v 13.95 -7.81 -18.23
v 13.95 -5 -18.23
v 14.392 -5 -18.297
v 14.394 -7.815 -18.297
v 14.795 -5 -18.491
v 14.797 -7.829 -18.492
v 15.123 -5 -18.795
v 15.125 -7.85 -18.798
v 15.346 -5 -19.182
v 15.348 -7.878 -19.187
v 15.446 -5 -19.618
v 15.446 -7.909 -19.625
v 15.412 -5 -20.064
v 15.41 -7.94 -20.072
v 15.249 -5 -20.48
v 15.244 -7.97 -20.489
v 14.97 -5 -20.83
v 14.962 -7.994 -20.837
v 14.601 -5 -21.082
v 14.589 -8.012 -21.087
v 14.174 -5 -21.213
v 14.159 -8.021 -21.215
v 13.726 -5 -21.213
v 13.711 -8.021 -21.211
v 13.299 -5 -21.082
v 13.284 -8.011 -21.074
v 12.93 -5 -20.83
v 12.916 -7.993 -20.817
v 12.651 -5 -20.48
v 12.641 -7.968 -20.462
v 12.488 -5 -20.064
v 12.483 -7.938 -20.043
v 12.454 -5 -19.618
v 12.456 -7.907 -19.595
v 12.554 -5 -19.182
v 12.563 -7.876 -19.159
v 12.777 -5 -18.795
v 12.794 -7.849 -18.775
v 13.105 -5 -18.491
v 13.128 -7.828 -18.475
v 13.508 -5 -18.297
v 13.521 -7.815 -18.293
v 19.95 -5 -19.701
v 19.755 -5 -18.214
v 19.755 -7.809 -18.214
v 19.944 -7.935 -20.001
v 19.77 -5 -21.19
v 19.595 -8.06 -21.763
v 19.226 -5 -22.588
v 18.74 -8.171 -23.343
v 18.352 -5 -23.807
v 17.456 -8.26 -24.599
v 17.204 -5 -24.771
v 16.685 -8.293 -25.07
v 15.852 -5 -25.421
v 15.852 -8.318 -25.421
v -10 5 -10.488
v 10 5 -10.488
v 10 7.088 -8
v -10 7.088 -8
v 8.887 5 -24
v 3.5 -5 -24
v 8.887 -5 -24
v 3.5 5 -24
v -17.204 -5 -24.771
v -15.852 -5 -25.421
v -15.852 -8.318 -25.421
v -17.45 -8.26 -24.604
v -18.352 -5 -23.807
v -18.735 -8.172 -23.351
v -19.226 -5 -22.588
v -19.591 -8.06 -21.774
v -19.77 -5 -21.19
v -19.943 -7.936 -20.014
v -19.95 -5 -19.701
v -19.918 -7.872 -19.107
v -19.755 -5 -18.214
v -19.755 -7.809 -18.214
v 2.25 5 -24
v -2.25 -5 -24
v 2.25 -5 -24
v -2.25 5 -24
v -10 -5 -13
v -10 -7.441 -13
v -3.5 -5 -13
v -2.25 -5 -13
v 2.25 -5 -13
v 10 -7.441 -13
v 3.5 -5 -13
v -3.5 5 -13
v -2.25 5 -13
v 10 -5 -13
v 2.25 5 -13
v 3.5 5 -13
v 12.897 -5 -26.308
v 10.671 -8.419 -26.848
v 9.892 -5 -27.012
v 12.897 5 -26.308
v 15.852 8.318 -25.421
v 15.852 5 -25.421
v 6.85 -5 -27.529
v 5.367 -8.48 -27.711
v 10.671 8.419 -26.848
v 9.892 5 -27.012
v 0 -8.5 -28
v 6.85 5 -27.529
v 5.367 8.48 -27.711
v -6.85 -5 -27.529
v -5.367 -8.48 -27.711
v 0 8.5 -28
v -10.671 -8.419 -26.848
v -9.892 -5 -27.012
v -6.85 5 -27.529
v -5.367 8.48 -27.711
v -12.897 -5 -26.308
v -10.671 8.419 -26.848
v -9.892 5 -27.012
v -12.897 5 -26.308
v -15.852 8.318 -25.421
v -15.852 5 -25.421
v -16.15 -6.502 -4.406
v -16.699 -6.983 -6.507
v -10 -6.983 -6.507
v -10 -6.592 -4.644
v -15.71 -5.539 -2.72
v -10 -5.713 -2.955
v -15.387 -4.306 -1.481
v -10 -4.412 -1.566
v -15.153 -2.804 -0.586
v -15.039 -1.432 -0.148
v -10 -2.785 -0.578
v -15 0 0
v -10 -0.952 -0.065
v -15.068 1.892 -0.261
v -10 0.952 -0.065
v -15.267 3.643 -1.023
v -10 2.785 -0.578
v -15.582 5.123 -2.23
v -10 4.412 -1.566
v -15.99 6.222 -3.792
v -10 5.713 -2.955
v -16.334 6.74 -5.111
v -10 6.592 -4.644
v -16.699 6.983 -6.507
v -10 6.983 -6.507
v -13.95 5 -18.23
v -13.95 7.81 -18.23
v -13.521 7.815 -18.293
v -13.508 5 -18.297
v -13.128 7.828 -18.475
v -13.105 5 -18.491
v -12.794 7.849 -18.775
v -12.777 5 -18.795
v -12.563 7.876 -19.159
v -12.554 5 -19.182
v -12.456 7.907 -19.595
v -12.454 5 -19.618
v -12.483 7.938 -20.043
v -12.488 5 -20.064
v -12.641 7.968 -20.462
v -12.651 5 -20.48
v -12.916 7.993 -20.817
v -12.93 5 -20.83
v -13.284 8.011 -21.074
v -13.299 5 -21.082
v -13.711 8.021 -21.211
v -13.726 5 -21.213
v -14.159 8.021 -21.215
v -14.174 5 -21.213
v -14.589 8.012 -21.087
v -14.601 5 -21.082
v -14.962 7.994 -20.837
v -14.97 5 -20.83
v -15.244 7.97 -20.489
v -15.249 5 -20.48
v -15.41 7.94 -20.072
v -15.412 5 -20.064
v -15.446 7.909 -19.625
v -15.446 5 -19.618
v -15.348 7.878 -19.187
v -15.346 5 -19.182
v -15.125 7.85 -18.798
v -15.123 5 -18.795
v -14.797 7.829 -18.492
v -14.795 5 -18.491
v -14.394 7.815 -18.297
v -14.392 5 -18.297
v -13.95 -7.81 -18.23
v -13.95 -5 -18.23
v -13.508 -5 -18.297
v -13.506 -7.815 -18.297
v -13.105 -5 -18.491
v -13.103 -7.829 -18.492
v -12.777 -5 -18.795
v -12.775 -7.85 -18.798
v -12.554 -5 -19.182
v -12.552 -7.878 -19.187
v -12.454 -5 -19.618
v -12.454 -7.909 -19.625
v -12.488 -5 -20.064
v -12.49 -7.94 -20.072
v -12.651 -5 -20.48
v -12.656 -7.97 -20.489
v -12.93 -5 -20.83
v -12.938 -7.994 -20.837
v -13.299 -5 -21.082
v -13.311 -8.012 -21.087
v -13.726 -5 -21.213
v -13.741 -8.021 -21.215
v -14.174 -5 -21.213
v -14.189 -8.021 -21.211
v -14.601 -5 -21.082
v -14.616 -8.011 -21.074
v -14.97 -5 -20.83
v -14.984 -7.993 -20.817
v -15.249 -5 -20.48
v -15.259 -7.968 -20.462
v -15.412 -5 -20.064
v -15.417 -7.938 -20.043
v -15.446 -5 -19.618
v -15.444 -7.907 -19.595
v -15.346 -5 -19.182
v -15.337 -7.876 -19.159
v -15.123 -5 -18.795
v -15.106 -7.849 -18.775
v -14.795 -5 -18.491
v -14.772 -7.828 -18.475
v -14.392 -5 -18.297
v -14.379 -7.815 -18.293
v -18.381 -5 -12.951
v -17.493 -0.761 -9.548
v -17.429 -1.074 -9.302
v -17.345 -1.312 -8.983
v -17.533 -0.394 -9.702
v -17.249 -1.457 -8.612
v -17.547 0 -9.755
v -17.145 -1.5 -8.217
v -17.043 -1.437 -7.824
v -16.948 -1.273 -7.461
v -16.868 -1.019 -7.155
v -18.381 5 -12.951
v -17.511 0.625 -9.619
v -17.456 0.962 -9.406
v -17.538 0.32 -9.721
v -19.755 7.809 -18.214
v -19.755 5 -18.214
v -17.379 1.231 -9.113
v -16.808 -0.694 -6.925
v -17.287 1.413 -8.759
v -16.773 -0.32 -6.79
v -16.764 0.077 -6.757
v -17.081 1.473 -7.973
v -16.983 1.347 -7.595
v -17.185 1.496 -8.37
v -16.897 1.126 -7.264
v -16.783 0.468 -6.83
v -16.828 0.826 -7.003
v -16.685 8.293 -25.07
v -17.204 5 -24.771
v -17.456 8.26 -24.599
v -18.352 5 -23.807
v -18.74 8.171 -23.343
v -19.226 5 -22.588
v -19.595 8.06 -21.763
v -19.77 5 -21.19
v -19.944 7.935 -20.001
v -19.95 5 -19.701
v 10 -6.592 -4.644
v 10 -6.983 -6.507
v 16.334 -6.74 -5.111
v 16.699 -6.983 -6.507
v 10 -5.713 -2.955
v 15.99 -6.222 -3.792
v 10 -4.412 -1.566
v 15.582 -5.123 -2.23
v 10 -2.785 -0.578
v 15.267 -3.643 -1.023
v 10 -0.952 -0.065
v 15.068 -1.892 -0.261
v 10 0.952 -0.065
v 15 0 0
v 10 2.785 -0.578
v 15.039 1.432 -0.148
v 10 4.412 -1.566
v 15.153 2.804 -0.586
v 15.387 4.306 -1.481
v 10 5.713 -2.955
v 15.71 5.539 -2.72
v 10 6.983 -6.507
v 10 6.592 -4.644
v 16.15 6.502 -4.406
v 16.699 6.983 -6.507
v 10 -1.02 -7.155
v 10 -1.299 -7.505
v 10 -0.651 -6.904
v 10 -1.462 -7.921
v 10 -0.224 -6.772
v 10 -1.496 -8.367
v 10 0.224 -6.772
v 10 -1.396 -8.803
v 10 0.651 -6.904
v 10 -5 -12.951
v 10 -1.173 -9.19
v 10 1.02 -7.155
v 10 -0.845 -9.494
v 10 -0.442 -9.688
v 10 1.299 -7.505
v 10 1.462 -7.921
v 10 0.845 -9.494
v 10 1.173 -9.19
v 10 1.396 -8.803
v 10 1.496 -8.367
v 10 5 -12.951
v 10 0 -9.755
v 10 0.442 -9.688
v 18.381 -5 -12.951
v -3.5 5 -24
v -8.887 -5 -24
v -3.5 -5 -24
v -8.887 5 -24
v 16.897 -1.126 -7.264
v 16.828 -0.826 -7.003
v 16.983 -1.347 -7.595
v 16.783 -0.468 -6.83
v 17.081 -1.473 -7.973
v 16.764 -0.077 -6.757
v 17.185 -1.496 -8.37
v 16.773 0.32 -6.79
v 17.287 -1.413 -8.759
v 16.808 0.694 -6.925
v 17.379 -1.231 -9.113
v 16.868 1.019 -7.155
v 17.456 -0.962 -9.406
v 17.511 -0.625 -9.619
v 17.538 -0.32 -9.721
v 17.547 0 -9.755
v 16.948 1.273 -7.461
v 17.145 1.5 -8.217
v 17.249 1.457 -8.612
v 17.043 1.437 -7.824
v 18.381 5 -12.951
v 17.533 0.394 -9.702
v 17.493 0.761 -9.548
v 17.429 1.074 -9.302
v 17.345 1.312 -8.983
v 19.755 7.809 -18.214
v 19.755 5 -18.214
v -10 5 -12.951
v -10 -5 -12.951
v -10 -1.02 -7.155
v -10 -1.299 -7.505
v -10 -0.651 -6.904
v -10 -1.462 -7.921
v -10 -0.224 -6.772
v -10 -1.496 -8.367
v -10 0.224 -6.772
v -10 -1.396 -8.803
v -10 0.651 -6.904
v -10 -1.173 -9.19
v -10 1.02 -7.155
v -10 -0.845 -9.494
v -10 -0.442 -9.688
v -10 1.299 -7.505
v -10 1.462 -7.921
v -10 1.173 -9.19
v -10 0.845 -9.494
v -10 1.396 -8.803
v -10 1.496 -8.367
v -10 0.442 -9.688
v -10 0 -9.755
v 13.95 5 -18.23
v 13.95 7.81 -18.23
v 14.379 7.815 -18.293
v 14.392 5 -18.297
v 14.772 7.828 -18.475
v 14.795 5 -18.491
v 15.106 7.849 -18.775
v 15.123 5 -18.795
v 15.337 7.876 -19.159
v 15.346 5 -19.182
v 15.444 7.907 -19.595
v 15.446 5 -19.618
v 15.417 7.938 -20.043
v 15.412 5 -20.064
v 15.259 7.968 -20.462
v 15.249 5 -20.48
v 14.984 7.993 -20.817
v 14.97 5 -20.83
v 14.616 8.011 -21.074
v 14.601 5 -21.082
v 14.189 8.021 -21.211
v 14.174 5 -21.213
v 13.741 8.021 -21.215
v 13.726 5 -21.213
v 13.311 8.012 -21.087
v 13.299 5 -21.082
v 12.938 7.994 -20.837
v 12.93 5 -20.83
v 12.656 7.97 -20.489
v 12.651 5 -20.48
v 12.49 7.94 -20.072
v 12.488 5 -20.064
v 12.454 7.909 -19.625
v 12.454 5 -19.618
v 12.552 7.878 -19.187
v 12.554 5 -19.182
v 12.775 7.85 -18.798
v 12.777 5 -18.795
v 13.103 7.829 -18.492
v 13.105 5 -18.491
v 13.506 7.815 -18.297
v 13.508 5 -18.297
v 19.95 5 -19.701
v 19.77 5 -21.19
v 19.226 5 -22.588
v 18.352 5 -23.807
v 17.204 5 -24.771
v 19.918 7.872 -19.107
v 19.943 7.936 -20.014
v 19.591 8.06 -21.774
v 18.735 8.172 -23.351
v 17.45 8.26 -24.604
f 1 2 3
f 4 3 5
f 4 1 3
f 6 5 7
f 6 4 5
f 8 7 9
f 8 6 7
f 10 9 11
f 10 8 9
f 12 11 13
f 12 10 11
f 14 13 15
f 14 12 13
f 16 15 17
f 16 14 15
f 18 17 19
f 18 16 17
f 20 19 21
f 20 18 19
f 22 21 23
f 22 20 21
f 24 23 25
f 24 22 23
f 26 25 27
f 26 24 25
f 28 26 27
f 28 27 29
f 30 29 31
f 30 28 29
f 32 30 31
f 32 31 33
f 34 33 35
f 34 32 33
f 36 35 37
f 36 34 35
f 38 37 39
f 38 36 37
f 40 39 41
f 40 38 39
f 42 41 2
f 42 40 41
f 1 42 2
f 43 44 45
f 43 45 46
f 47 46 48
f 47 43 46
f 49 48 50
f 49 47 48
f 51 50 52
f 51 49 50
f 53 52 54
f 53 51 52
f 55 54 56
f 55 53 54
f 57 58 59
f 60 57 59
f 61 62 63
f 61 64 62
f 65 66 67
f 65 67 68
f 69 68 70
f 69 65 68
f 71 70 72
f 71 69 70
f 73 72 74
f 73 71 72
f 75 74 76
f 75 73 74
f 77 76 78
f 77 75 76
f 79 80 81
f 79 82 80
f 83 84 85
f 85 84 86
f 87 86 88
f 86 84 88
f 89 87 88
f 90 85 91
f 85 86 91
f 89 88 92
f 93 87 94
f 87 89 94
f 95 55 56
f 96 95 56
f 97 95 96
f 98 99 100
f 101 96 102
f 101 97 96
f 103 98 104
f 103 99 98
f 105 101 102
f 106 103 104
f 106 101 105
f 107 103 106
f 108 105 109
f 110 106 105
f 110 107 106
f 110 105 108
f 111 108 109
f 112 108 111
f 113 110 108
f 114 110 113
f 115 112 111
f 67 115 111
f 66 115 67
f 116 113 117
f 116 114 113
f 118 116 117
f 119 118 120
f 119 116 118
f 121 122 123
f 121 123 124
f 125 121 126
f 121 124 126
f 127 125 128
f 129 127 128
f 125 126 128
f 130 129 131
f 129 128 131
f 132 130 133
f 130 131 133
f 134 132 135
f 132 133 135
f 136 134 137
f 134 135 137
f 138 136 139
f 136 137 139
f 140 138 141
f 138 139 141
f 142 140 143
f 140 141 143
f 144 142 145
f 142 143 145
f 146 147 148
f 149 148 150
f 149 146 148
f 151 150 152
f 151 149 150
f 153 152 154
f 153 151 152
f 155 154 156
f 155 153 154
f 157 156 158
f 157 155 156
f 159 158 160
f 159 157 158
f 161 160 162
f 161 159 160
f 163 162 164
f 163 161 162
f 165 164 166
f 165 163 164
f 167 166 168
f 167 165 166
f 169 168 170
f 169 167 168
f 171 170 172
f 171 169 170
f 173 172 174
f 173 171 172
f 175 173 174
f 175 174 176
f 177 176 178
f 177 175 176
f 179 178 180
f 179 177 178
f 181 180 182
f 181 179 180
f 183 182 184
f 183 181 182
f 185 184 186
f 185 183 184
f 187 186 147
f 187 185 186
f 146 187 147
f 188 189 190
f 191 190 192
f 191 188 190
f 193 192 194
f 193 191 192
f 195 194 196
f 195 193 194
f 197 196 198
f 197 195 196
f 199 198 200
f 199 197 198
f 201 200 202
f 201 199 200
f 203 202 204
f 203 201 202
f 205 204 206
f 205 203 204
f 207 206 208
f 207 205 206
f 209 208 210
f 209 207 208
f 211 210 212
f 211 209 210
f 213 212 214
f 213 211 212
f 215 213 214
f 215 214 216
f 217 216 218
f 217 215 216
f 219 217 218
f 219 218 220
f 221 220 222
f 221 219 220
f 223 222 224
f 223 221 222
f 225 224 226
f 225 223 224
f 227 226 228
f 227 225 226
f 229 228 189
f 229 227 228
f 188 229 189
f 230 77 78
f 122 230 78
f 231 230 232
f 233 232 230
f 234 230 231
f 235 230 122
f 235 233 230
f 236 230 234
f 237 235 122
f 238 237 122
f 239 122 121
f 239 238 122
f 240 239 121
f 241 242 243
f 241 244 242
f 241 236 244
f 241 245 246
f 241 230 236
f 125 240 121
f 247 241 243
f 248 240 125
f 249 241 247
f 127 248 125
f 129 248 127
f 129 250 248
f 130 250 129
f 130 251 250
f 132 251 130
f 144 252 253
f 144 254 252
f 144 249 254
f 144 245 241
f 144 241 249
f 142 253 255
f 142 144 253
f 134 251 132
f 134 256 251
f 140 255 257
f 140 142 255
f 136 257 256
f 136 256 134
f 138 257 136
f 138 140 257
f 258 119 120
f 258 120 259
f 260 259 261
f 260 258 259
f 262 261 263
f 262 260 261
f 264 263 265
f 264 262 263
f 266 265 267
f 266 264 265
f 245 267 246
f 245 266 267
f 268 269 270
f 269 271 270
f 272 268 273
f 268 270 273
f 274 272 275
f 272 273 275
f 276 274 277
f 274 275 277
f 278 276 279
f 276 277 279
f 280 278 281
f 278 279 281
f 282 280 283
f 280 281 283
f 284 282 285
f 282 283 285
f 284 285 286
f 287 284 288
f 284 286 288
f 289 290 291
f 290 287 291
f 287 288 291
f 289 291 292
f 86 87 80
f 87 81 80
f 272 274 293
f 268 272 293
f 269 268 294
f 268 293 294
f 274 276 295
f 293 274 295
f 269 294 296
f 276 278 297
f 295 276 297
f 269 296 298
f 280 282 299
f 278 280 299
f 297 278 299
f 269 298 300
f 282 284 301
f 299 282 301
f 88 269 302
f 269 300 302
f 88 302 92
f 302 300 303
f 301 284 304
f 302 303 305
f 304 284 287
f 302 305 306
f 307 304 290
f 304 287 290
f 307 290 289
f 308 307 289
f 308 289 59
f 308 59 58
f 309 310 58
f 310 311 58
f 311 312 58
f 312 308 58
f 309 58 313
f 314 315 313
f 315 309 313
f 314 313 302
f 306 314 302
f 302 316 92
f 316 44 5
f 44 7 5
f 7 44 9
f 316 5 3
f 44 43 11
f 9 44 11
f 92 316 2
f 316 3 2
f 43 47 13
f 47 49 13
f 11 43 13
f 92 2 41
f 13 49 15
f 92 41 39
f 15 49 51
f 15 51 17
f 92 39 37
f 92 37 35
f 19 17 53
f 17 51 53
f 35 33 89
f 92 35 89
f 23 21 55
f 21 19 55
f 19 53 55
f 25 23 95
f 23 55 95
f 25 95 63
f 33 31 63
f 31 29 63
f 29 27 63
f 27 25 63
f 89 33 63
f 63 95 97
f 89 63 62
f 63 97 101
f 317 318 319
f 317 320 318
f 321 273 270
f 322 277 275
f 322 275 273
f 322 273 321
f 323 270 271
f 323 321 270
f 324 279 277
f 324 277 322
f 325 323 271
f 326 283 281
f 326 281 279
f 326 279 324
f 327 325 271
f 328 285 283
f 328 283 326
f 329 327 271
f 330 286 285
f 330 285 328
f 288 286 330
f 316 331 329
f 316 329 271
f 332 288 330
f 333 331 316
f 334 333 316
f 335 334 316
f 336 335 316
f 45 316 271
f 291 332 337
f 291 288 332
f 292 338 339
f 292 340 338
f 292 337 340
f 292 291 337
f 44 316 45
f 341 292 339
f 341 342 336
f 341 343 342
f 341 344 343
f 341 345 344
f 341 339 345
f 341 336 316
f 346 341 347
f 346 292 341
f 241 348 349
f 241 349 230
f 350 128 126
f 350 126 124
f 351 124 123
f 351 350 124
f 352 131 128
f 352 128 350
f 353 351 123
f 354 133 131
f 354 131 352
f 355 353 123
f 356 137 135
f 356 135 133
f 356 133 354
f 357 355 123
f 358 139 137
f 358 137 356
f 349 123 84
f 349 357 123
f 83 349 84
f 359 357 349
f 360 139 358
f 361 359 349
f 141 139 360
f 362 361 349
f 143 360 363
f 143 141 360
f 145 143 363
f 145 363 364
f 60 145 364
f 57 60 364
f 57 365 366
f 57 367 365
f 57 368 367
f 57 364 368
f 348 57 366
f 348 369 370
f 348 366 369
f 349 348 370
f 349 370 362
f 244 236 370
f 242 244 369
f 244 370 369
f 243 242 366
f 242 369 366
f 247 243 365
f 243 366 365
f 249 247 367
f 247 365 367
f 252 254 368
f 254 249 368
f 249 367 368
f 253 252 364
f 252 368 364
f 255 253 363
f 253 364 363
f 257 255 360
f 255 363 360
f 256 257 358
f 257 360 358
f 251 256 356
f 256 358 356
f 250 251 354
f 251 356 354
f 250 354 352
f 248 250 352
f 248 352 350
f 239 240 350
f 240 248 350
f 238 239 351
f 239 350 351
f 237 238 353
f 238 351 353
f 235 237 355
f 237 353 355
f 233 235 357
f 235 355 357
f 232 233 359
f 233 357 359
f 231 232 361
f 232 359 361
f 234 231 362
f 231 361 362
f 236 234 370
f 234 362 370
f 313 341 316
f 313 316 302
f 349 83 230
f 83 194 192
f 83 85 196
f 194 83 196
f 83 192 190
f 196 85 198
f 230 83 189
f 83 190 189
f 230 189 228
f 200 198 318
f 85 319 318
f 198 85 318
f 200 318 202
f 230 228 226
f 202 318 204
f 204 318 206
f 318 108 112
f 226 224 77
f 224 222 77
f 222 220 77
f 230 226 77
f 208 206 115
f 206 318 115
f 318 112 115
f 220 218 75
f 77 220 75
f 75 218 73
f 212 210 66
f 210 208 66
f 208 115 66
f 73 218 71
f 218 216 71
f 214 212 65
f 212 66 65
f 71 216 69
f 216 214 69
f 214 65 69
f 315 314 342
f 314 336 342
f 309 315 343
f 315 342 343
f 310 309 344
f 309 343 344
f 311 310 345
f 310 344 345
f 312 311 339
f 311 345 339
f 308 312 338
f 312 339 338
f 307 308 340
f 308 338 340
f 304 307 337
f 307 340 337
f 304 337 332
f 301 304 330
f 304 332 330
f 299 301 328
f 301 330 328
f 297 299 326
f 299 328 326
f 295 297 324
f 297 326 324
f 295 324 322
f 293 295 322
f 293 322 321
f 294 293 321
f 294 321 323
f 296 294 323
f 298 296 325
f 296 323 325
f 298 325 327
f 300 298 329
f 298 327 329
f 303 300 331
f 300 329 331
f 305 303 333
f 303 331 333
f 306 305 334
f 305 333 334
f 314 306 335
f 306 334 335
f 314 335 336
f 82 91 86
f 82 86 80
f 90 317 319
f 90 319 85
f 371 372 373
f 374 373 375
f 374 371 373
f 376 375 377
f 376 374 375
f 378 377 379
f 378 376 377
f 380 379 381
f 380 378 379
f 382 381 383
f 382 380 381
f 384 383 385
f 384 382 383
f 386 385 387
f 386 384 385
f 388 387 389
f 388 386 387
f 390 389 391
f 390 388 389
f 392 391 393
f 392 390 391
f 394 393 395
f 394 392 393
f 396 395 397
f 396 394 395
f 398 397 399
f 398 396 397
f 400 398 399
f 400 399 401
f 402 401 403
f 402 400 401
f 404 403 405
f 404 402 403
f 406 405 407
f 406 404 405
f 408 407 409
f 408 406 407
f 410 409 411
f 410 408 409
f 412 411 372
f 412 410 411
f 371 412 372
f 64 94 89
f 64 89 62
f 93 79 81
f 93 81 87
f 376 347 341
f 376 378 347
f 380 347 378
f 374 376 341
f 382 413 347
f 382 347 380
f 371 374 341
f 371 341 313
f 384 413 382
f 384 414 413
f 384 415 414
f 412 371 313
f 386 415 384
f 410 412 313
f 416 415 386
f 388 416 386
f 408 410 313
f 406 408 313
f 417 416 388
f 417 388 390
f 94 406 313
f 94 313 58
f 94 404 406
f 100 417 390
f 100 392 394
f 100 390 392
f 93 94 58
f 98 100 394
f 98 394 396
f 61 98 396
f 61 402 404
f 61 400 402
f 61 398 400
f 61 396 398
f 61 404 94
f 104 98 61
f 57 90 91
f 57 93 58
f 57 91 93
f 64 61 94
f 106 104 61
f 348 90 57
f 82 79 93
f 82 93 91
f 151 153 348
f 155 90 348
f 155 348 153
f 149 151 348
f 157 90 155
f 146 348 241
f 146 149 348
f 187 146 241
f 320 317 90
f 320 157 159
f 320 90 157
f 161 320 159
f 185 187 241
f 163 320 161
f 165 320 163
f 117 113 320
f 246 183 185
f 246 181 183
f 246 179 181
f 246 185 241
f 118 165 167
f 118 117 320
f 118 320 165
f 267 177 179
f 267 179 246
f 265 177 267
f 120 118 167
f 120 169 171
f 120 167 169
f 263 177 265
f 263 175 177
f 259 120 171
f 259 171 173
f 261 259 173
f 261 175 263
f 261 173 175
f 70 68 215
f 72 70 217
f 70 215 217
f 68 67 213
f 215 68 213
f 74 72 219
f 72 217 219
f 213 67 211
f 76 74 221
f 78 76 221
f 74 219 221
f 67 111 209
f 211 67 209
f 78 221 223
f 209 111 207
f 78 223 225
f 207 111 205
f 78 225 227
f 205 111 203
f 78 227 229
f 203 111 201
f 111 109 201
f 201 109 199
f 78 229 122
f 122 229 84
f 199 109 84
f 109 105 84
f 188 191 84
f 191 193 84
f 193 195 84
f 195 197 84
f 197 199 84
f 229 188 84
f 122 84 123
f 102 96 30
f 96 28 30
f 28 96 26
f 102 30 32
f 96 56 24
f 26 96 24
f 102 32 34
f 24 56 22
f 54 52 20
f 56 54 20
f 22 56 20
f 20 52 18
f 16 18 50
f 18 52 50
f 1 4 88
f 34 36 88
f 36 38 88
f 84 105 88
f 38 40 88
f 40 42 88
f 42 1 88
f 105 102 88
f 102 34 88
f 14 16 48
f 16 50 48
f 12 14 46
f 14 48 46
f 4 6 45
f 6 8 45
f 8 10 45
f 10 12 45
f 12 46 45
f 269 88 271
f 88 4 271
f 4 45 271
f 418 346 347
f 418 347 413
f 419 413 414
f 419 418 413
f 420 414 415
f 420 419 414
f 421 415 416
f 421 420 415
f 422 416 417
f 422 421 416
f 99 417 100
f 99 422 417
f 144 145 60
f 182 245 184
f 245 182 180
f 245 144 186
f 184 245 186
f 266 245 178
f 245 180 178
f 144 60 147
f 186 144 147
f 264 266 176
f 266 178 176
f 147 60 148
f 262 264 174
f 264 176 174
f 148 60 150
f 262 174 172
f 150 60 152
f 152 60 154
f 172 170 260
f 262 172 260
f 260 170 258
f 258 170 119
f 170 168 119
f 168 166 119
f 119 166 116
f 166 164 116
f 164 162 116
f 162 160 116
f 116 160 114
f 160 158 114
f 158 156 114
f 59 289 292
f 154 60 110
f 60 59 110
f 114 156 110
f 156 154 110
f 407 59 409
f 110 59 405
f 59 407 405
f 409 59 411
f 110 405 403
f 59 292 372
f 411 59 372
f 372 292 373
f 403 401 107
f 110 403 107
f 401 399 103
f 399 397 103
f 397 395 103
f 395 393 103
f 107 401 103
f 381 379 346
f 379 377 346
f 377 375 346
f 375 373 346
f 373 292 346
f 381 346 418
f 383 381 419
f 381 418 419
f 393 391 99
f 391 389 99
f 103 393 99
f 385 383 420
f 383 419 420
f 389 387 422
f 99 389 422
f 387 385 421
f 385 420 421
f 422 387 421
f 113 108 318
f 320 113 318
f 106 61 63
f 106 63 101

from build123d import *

# Parameters (mm, degrees)
SKETCH1_R          = 1.5
EXTRUDE1_DEPTH     = 8.5
SKETCH2_R          = 1.5
CUT_EXTRUDE1_DEPTH = 25
CUT_EXTRUDE2_DEPTH = 10
CUT_EXTRUDE3_DEPTH = 5


with BuildPart() as part:
    # Sketch1 → Extrude1 (new, symmetric)
    with BuildSketch(Plane(origin=(0, 0, 0), x_dir=(1, 0, 0), z_dir=(0, 1, 0))):
        with BuildLine():
            Line((-15, 0), (15, 0))
            Line((15, 0), (19.755405538, 18.21438149))
            ThreePointArc((19.755405538, 18.21438149), (19.225810264, 22.587646069), (15.852272727, 25.420517177))
            ThreePointArc((15.852272727, 25.420517177), (0, 28), (-15.852272727, 25.420517177))
            ThreePointArc((-15.852272727, 25.420517177), (-19.225810264, 22.587646069), (-19.755405538, 18.21438149))
            Line((-19.755405538, 18.21438149), (-15, 0))
        make_face()
        with Locations((-13.95, 19.730055116)):
            Circle(SKETCH1_R, mode=Mode.SUBTRACT)
        with Locations((13.95, 19.730055116)):
            Circle(SKETCH1_R, mode=Mode.SUBTRACT)
    extrude(amount=EXTRUDE1_DEPTH, both=True)

    # Sketch2 → Cut-Extrude1 (cut, symmetric)
    with BuildSketch(Plane(origin=(0, 0, 0), x_dir=(0, 0, -1), z_dir=(1, 0, 0))):
        with Locations((8.255055116, 0)):
            Circle(SKETCH2_R)
        with BuildLine():
            Line((6.507034671, 6.982620223), (29, 8.570598903))
            Line((29, 8.570598903), (29, 9.570598903))
            Line((29, 9.570598903), (-1, 9.570598903))
            Line((-1, 9.570598903), (-1, -9.570598903))
            Line((-1, -9.570598903), (29, -9.570598903))
            Line((29, -9.570598903), (29, -8.570598903))
            Line((29, -8.570598903), (6.507034671, -6.982620223))
            ThreePointArc((6.507034671, -6.982620223), (0, 0), (6.507034671, 6.982620223))
        make_face()
    extrude(amount=CUT_EXTRUDE1_DEPTH, both=True, mode=Mode.SUBTRACT)

    # Sketch4 → Cut-Extrude2 (cut, symmetric)
    with BuildSketch(Plane(origin=(0, 0, 0), x_dir=(0, 0, -1), z_dir=(1, 0, 0))):
        Polygon((-2, -8.5), (13, -8.5), (13, 5), (10.488407646, 5), (5.125516479, 9.5), (-2, 9.5), align=None)
    extrude(amount=CUT_EXTRUDE2_DEPTH, both=True, mode=Mode.SUBTRACT)

    # Sketch7 → Cut-Extrude3 (cut, symmetric)
    with BuildSketch(Plane(origin=(0, 0, 0), x_dir=(1, 0, 0), z_dir=(0, 1, 0))):
        Polygon((-10, 6.507034671), (-10, 12.951116752), (-21.755405538, 12.951116752), (-21.755405538, 29), (-6, 29), (-8.886751346, 24), (-3.5, 24), (-3.5, 8), (-2.25, 8), (-2.25, 24), (2.25, 24), (2.25, 8), (3.5, 8), (3.5, 24), (8.886751346, 24), (6, 29), (21.755405538, 29), (21.755405538, 12.951116752), (10, 12.951116752), (10, 6.507034671), align=None)
    extrude(amount=CUT_EXTRUDE3_DEPTH, both=True, mode=Mode.SUBTRACT)


solid = part.part
